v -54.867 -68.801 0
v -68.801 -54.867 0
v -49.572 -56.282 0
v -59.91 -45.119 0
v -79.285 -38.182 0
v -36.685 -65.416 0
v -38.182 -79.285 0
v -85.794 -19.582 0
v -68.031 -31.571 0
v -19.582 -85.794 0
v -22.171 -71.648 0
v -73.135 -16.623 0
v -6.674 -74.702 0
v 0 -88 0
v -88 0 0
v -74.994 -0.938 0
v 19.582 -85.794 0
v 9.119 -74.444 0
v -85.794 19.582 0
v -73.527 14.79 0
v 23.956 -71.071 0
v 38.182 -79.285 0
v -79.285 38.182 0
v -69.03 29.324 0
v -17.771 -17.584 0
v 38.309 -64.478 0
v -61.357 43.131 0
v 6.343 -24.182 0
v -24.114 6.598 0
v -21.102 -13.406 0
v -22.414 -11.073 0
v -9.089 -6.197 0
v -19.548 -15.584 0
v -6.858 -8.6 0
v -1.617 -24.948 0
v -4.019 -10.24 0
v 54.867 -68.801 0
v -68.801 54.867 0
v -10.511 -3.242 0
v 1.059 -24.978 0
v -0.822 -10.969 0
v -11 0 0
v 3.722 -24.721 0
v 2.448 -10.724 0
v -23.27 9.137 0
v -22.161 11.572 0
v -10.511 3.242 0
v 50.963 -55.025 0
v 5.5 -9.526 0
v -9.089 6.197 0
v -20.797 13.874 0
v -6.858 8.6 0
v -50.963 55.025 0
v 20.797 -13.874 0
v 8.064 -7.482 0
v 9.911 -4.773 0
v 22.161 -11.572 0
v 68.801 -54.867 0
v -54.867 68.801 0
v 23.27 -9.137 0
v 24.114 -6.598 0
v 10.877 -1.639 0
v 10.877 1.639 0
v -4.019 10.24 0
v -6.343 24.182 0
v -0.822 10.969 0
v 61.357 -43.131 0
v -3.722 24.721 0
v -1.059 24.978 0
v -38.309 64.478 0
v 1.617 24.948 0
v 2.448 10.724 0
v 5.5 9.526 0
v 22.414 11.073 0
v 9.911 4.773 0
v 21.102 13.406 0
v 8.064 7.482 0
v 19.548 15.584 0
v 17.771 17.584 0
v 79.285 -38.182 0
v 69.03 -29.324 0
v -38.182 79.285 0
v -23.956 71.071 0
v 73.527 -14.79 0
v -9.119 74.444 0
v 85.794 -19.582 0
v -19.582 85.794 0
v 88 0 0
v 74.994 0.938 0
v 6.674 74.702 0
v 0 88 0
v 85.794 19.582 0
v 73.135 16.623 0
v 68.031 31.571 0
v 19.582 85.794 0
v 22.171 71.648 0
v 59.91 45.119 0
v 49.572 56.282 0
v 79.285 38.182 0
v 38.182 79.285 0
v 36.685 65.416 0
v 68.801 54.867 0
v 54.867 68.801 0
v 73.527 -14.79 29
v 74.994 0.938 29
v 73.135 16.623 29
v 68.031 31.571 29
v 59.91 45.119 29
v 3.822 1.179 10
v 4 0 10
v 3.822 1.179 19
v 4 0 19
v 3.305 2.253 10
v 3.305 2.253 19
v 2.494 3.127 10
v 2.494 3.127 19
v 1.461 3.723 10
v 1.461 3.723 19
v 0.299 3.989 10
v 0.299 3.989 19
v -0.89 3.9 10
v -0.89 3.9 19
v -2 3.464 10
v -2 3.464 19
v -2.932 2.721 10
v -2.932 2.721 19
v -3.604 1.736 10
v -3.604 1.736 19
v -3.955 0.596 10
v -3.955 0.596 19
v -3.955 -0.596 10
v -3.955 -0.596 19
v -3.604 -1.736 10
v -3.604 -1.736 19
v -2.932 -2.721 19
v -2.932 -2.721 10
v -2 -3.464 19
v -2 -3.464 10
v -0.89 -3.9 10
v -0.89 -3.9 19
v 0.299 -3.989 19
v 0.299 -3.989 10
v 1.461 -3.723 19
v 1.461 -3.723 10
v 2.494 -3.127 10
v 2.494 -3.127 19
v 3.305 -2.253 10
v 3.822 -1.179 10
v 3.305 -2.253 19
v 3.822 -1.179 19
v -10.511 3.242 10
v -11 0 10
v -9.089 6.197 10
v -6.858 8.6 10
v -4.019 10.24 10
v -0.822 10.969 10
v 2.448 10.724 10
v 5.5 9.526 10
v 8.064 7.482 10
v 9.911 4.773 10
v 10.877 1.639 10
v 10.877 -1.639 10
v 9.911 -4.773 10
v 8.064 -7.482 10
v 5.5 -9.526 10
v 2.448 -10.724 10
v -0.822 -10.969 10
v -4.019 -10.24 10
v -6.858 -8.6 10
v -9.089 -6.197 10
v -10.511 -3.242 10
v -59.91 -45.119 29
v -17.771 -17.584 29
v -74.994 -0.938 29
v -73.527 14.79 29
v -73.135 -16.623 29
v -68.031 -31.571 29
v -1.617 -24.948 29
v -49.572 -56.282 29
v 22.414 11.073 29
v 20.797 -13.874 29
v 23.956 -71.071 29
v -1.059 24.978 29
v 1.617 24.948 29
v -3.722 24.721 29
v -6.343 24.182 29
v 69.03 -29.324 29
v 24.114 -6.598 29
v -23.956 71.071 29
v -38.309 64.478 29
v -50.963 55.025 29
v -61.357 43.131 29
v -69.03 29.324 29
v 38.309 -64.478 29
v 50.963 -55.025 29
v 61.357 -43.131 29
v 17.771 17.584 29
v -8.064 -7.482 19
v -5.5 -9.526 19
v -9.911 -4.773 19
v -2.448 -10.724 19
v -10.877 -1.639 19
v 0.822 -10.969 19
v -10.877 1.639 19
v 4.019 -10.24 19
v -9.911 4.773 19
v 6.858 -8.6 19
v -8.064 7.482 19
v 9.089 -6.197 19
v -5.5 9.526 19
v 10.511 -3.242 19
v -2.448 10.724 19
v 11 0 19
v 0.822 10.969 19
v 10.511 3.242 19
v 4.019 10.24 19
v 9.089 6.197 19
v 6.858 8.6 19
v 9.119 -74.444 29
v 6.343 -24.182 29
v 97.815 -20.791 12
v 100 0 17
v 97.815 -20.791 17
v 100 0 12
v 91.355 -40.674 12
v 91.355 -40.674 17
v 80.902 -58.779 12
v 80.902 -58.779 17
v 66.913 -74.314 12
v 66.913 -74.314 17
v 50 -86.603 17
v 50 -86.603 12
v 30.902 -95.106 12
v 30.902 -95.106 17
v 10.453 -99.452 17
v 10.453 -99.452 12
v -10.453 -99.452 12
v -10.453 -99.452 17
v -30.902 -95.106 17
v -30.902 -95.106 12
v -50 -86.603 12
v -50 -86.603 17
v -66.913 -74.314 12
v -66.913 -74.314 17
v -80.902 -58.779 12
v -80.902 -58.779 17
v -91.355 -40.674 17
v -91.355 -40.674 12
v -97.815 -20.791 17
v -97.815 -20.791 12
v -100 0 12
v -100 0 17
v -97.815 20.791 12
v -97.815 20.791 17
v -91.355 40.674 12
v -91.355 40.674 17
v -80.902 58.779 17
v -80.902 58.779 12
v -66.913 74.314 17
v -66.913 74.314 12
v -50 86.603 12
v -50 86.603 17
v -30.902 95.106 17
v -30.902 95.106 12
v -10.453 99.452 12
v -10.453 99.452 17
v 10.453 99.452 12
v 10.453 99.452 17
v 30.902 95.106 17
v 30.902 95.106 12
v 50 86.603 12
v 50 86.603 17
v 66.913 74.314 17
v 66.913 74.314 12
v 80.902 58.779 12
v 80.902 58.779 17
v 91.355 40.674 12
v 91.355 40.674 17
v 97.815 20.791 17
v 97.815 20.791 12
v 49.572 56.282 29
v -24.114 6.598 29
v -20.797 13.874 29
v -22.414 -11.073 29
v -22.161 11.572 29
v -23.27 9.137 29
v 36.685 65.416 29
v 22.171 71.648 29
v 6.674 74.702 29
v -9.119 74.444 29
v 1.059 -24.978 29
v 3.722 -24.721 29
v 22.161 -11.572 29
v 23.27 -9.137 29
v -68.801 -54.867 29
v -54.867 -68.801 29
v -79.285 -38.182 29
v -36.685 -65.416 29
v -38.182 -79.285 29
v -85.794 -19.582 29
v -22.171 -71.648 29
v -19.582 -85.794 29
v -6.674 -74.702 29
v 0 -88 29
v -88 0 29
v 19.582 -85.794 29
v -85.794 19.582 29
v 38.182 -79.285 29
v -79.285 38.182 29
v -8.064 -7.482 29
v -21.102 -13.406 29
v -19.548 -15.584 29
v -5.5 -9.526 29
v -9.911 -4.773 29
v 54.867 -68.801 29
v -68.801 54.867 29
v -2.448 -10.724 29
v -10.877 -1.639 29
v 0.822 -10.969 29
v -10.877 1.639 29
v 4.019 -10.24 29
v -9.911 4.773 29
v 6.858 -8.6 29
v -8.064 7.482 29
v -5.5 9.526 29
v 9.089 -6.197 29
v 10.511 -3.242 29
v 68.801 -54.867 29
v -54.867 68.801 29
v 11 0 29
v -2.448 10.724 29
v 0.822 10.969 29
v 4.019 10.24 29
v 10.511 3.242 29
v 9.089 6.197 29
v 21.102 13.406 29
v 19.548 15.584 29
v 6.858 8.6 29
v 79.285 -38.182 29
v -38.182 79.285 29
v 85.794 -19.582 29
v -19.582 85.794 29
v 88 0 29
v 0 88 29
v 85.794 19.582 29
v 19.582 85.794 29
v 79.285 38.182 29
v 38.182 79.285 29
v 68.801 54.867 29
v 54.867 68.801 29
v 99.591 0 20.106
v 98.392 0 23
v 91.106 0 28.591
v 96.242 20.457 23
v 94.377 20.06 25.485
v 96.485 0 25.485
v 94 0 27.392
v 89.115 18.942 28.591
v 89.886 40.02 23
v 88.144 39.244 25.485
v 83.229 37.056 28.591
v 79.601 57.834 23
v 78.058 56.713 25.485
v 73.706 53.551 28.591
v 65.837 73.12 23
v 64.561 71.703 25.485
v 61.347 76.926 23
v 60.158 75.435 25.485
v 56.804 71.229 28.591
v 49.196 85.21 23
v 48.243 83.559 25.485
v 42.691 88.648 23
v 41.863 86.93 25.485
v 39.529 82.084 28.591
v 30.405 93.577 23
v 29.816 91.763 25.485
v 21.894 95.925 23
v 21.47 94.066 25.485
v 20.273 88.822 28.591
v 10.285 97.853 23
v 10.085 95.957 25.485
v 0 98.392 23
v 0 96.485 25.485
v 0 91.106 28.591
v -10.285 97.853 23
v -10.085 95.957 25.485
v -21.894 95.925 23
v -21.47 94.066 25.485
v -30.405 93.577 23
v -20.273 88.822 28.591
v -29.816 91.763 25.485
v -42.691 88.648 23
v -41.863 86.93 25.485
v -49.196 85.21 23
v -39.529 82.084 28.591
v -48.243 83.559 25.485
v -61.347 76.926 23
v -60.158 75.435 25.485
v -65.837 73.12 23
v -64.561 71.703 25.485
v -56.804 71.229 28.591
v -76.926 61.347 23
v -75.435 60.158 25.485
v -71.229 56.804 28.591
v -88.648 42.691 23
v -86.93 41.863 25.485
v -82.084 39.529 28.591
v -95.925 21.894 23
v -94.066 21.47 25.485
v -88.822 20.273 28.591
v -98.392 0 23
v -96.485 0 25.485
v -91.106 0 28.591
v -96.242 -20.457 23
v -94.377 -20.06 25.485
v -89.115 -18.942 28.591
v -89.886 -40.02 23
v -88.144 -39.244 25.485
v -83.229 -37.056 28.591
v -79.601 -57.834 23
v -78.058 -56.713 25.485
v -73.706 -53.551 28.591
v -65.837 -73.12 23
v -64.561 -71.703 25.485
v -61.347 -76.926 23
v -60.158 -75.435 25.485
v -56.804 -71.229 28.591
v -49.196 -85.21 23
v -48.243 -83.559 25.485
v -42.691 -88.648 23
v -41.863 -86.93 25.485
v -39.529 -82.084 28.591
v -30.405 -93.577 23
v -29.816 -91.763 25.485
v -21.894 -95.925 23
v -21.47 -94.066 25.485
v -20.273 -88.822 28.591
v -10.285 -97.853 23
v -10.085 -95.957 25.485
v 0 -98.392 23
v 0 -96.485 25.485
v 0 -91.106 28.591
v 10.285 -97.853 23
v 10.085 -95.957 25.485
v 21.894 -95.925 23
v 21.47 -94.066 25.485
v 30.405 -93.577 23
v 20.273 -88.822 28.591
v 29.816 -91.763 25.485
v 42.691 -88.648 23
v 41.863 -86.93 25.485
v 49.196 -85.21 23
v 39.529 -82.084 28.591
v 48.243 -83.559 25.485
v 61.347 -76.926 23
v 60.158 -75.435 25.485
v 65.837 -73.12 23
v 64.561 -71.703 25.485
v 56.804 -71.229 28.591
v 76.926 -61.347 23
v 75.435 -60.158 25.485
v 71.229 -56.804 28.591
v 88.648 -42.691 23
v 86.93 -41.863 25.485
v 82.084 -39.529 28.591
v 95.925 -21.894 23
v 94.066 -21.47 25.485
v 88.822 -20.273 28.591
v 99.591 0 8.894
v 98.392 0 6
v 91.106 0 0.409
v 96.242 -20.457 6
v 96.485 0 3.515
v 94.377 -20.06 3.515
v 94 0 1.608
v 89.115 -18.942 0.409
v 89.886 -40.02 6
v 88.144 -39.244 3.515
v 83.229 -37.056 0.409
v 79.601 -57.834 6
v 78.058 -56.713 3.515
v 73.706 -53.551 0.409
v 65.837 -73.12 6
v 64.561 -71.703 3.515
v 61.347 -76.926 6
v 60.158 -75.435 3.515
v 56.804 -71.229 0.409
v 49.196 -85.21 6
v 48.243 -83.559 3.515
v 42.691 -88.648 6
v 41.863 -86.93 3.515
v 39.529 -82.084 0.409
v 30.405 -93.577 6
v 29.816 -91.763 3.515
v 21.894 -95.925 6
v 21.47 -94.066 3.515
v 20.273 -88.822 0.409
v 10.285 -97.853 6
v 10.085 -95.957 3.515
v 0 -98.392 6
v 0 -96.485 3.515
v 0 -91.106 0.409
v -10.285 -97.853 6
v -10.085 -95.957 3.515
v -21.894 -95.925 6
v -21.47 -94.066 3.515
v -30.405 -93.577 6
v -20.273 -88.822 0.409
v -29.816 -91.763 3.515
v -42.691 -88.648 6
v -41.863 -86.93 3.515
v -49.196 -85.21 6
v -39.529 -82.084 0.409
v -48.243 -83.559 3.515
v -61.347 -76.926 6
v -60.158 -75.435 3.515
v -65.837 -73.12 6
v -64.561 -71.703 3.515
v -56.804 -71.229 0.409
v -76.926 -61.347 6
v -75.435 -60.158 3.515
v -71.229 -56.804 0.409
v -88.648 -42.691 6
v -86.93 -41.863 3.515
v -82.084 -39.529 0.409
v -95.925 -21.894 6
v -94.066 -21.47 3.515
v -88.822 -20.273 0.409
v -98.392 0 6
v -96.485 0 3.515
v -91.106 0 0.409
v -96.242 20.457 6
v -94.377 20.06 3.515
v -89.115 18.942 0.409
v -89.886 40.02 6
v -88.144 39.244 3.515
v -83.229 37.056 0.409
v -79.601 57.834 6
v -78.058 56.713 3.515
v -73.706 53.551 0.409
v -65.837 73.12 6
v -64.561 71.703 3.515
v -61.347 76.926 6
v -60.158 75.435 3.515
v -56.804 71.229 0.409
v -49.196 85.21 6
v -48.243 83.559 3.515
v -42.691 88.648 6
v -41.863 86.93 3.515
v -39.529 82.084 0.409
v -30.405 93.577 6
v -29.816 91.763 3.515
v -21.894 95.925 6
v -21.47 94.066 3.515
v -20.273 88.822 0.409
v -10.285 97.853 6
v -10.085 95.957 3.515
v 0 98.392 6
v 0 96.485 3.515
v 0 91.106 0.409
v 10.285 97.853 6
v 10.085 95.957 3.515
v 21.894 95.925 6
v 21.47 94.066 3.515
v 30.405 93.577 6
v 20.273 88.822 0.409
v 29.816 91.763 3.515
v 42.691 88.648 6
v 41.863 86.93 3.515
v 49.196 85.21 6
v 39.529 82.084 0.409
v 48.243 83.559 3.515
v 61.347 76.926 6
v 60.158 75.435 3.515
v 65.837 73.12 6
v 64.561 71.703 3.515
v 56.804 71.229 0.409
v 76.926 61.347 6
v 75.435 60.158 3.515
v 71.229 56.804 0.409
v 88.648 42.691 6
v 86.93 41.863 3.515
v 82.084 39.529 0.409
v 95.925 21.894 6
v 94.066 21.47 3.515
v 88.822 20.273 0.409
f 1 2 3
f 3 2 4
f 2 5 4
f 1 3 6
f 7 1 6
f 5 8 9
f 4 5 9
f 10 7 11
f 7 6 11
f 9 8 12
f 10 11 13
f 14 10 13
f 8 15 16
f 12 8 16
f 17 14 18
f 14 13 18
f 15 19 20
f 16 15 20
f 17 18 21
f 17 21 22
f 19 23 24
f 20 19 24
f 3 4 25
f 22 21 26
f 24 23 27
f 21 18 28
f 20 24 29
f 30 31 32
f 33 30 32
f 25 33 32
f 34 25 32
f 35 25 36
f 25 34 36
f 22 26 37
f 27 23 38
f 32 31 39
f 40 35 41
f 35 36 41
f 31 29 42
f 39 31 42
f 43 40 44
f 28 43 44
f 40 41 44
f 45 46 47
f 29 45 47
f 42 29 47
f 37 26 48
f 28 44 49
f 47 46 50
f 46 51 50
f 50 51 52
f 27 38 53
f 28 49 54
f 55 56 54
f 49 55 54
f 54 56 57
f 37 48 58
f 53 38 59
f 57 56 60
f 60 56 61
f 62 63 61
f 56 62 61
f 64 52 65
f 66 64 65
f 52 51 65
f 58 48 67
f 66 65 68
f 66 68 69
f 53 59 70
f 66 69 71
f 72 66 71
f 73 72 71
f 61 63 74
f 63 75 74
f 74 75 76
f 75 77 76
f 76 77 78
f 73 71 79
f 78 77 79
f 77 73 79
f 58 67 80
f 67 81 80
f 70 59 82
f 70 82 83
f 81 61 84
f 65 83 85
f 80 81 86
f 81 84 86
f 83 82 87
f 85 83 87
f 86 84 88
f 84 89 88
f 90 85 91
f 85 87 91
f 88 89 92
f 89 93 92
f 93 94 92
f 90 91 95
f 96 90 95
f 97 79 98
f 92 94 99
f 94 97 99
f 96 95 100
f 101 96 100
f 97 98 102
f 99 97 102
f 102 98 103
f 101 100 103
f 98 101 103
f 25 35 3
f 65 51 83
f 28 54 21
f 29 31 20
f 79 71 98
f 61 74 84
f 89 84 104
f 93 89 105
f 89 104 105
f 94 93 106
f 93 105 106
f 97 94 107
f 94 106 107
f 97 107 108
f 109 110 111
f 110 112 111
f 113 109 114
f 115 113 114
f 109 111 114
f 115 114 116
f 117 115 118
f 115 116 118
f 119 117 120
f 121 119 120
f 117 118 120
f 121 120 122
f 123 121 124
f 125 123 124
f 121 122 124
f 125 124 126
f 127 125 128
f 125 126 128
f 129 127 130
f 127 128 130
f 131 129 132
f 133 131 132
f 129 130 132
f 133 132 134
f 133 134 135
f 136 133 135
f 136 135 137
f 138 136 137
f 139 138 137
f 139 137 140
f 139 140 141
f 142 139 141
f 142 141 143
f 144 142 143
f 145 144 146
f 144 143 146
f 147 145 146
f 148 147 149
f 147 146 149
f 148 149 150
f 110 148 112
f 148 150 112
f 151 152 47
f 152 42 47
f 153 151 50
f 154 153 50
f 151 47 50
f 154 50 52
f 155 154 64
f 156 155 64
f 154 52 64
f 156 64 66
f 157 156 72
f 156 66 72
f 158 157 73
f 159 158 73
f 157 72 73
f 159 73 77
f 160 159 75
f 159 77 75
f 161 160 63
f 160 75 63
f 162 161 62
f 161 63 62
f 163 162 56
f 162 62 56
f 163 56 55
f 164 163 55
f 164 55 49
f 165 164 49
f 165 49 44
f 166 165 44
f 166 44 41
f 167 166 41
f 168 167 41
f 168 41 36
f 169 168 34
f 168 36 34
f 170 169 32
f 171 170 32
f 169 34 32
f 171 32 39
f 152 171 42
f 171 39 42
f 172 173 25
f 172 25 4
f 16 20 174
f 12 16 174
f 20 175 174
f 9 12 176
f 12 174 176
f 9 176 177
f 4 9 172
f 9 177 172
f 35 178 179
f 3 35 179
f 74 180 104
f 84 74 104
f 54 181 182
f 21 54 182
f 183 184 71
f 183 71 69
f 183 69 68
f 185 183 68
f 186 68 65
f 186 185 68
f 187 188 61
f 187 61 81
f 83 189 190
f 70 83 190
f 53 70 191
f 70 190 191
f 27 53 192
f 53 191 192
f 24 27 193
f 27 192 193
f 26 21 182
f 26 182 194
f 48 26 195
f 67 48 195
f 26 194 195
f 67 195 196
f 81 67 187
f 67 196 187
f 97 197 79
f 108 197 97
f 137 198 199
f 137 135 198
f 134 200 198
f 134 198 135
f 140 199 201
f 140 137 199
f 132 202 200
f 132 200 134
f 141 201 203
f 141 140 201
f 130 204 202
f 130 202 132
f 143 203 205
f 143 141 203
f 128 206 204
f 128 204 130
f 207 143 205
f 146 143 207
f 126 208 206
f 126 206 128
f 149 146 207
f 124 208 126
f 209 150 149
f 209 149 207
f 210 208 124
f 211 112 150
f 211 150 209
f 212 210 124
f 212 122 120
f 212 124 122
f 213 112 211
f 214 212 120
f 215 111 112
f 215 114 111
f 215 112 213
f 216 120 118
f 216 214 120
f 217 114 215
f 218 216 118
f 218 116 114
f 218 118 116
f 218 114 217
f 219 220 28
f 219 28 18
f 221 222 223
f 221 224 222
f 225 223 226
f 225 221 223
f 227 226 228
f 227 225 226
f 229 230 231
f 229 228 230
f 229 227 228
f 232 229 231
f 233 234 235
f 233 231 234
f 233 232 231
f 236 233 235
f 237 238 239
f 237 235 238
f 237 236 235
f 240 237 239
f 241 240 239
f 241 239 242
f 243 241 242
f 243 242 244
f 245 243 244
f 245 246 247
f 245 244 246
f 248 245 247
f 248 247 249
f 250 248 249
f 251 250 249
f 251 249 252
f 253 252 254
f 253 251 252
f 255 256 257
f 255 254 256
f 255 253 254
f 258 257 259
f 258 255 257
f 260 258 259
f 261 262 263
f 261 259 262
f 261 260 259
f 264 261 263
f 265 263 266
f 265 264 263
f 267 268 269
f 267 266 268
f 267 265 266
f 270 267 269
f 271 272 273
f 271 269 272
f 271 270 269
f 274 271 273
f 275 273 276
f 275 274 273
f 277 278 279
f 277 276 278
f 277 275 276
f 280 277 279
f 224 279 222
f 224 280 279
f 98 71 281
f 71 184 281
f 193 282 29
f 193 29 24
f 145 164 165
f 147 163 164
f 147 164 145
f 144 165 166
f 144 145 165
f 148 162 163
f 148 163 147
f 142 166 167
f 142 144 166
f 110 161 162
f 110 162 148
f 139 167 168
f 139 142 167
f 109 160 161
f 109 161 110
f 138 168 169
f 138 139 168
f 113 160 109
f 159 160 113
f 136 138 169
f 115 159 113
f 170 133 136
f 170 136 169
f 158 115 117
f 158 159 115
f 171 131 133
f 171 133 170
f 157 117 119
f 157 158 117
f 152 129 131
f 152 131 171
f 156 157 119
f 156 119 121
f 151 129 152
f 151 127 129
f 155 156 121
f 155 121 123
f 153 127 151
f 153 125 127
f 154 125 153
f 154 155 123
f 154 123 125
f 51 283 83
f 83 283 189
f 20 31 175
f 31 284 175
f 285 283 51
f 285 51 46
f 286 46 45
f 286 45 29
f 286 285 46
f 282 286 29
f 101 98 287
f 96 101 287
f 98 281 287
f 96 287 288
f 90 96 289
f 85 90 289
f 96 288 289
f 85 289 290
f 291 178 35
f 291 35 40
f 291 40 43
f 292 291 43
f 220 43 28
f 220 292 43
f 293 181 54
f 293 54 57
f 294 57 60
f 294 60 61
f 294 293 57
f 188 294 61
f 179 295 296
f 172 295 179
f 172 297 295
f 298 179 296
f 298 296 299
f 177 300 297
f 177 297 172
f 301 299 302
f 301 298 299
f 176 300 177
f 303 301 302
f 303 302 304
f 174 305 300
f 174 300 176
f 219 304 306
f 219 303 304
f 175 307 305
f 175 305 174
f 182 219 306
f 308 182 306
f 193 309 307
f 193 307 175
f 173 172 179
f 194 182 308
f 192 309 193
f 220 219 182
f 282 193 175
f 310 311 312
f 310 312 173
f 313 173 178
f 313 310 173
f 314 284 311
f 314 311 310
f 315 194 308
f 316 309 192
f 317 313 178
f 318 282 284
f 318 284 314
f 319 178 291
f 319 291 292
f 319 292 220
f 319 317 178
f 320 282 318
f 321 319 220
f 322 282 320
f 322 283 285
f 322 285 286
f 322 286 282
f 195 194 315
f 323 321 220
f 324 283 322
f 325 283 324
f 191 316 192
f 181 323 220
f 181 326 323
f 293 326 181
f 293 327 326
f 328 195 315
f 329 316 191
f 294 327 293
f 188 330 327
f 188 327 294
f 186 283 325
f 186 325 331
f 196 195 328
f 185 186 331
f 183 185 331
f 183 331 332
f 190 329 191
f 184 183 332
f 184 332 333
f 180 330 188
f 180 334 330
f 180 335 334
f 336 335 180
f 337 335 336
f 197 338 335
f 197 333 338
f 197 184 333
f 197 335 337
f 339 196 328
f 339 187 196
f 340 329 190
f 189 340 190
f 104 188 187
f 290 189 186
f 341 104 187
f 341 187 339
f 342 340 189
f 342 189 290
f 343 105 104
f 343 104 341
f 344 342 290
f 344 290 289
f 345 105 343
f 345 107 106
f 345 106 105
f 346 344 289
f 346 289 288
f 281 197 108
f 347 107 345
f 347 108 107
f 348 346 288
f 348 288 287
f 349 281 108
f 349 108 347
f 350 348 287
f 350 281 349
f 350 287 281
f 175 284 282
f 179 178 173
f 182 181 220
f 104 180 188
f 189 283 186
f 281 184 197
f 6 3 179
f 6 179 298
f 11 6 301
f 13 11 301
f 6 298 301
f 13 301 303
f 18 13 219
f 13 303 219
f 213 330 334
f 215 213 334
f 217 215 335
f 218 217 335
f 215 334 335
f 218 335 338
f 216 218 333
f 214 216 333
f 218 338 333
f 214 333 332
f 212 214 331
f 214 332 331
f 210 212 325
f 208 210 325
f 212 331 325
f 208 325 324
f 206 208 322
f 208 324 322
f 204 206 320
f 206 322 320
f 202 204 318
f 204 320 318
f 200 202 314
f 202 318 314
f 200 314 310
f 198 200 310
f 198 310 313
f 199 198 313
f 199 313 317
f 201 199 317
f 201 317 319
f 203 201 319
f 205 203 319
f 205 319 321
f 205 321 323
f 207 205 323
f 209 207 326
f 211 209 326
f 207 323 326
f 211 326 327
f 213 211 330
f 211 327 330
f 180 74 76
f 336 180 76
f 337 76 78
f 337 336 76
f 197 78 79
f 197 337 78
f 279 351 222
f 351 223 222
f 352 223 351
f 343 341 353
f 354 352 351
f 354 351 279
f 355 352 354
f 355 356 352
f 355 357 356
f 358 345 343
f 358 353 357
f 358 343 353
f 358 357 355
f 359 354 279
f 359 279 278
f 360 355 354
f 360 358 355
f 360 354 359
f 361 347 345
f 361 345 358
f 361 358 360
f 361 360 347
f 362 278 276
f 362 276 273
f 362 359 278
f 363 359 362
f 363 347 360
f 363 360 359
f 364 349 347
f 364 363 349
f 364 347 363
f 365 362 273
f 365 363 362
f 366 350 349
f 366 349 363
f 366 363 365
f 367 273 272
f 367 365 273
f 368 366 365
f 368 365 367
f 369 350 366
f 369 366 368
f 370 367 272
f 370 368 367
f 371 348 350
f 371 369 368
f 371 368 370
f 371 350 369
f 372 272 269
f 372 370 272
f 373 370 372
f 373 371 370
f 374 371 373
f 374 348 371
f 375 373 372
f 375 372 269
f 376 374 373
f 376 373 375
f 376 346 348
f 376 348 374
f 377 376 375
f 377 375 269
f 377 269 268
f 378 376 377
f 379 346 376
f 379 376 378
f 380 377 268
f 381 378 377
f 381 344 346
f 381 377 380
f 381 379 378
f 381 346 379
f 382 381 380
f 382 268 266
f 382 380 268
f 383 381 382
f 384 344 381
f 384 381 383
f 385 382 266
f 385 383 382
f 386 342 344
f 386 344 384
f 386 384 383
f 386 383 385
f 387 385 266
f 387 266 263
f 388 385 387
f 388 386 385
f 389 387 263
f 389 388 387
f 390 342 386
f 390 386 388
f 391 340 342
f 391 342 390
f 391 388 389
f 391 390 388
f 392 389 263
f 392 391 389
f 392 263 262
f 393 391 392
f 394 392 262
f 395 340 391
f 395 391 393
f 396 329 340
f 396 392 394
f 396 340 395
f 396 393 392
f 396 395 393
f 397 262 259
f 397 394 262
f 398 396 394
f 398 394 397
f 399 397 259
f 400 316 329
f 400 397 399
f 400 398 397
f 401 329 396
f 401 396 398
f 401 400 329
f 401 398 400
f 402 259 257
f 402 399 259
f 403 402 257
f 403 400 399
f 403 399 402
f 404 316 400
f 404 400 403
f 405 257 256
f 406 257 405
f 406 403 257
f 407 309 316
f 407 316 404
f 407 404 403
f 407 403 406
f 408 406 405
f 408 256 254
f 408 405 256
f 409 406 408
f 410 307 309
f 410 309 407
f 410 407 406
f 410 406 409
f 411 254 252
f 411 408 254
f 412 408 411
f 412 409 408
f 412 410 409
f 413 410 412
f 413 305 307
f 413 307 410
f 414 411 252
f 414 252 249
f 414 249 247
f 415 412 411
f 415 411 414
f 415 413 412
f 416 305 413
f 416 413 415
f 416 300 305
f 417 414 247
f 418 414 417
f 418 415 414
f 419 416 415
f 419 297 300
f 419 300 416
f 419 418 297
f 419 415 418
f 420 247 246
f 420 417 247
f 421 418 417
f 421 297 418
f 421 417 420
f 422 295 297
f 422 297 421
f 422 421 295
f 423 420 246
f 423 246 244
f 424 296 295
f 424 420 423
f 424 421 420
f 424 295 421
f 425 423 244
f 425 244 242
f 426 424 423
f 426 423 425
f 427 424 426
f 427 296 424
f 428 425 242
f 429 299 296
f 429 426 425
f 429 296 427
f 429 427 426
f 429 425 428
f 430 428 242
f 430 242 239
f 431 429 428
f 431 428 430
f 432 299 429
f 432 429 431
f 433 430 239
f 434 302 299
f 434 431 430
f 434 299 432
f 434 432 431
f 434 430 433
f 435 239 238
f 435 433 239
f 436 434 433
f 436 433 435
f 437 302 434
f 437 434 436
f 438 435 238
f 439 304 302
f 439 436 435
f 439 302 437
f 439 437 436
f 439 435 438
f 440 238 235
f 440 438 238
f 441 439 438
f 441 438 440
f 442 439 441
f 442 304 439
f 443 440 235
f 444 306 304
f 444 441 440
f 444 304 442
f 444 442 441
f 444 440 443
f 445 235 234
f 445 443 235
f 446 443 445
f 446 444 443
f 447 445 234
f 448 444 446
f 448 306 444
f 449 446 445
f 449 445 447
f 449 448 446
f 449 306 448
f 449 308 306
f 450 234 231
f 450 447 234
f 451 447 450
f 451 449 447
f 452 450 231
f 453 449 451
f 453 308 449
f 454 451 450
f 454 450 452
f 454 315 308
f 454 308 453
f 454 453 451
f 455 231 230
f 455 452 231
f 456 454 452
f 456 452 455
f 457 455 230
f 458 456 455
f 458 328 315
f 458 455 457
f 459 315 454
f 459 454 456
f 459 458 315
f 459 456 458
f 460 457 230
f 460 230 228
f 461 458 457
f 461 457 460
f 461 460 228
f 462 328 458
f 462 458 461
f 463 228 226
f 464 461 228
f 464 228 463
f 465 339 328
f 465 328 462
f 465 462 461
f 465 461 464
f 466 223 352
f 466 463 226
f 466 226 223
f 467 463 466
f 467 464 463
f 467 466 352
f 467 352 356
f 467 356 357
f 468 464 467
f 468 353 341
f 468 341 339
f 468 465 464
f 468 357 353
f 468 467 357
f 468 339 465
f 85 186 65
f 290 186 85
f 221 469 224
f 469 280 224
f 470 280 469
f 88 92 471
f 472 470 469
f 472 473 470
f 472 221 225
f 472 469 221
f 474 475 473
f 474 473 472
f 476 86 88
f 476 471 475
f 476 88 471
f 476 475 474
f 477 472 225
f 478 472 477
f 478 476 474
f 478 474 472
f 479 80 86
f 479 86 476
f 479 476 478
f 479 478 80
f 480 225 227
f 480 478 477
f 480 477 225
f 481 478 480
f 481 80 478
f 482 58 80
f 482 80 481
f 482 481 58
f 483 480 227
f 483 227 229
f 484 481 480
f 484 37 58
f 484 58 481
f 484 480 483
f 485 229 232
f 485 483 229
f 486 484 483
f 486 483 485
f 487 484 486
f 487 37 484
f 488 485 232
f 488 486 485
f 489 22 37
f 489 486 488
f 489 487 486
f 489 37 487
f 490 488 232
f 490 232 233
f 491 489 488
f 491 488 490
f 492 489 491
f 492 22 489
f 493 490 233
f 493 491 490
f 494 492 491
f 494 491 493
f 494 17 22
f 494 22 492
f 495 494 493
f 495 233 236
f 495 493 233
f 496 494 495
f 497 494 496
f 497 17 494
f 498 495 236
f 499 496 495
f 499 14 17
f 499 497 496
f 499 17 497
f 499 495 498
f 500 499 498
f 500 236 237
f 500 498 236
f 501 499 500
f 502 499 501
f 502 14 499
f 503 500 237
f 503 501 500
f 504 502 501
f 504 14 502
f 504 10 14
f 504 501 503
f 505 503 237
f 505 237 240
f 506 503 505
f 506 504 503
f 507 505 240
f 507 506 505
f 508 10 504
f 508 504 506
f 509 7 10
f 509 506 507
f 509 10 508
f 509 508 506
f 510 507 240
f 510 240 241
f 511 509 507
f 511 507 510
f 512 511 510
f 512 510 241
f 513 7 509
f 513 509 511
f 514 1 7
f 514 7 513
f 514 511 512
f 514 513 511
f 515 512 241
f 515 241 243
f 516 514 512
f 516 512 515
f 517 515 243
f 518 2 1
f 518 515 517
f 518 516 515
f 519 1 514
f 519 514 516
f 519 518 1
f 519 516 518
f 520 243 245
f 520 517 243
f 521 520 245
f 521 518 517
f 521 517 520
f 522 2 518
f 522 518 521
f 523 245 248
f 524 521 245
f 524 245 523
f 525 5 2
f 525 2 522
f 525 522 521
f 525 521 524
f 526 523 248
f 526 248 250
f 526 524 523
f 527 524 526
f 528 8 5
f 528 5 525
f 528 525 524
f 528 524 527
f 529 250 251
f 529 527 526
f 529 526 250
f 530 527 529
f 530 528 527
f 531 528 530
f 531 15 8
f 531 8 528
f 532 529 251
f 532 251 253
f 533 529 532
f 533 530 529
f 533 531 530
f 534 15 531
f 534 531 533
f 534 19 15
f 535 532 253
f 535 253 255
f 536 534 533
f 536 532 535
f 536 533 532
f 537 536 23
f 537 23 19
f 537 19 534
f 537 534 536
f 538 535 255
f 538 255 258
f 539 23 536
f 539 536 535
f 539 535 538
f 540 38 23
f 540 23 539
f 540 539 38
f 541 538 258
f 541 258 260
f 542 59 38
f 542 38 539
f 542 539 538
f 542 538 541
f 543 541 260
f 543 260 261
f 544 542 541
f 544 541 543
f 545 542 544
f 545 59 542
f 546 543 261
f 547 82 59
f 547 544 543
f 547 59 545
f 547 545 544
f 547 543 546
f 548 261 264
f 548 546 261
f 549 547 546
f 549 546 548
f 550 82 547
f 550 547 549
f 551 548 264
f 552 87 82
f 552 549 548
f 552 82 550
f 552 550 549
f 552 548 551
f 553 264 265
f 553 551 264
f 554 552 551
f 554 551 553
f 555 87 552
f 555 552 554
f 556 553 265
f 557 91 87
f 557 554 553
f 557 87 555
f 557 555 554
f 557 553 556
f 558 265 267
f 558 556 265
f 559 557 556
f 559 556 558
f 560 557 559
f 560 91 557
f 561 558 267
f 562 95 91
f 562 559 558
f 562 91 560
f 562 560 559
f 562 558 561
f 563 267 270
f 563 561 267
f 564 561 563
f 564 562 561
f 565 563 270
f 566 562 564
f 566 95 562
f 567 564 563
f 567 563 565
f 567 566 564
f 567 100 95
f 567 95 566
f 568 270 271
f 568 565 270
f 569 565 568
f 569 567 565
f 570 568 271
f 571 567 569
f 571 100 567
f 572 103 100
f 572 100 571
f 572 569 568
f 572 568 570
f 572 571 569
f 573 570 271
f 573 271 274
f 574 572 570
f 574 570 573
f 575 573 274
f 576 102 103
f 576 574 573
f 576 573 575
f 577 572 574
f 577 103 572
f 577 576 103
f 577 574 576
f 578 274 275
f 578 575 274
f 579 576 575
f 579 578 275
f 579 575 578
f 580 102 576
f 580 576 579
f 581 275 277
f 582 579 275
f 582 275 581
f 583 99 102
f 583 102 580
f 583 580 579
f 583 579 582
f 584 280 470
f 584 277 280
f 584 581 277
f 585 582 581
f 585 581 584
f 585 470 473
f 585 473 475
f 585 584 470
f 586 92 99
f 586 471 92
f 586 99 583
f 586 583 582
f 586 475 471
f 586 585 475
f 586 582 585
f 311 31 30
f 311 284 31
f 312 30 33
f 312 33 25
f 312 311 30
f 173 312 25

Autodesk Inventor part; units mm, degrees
ref_plane "YZ Plane" through (0, 0, 0) normal (1, 0, 0) x (0, 1, 0)
ref_plane "XZ Plane" through (0, 0, 0) normal (0, 1, 0) x (-1, 0, 0)
ref_plane "XY Plane" through (0, 0, 0) normal (0, 0, 1) x (1, 0, 0)
sketch "Sketch1" plane through (0, 0, 0) normal (0, 0, 1) x (1, 0, 0)
  circle A0 centre (0, 0) radius 4
  circle A1 centre (0, 0) radius 100
  dimension "d0" = 8
  dimension "d1" = 200
extrude "Extrusion1" add sketch "Sketch1" along normal blind 29
fillet "Fillet1" radius 12 2 edges at (-100, 0, 29) (-100, 0, 0)
sketch "Sketch2" plane through (0, 0, 29) normal (0, 0, 1) x (1, 0, 0)
  circle A0 centre (0, 0) radius 88 projected
  line L0 (9.0297, 17.8456) -> (73.5273, -14.7895)
  line L1 (19.5363, -4.2815) -> (69.0295, -29.3245)
  arc A1 (19.5363, -4.2815) -> (9.0297, 17.8456) centre (0, 0) ccw
  arc A2 (69.0295, -29.3245) -> (73.5273, -14.7895) centre (0, 0) ccw
  line L2 (13.4761, 14.7782) -> (59.9105, 45.119)
  arc A3 (13.4761, 14.7782) -> (-10.9399, 16.7427) centre (0, 0) ccw
  arc A4 (59.9105, 45.119) -> (49.5718, 56.2818) centre (0, 0) ccw
  line L3 (-10.9399, 16.7427) -> (49.5718, 56.2818)
  line L4 (-6.0602, 19.0597) -> (-9.119, 74.4436)
  arc A5 (-6.0602, 19.0597) -> (-19.9696, -1.1029) centre (0, 0) ccw
  arc A6 (-9.119, 74.4436) -> (-23.9556, 71.0713) centre (0, 0) ccw
  line L5 (-19.9696, -1.1029) -> (-23.9556, 71.0713)
  line L6 (-19.5363, 4.2815) -> (-69.0295, 29.3245)
  arc A7 (-19.5363, 4.2815) -> (-9.0297, -17.8456) centre (0, 0) ccw
  arc A8 (-69.0295, 29.3245) -> (-73.5273, 14.7895) centre (0, 0) ccw
  line L7 (-9.0297, -17.8456) -> (-73.5273, 14.7895)
  line L8 (-13.4761, -14.7782) -> (-59.9105, -45.119)
  arc A9 (-13.4761, -14.7782) -> (10.9399, -16.7427) centre (0, 0) ccw
  arc A10 (-59.9105, -45.119) -> (-49.5718, -56.2818) centre (0, 0) ccw
  line L9 (10.9399, -16.7427) -> (-49.5718, -56.2818)
  line L10 (6.0602, -19.0597) -> (9.119, -74.4436)
  arc A11 (6.0602, -19.0597) -> (19.9696, 1.1029) centre (0, 0) ccw
  arc A12 (9.119, -74.4436) -> (23.9556, -71.0713) centre (0, 0) ccw
  line L11 (19.9696, 1.1029) -> (23.9556, -71.0713)
  circle A13 centre (0, 0) radius 4 projected
  circle A14 centre (0, 0) radius 75
  dimension "d7" = 15
  dimension "d8" = 75
  dimension "d9" = 20
  dimension "d12" = 360
extrude "Extrusion2" cut sketch "Sketch2" against normal through all contours A1 A11 A9 A7 A5 A3 | L2 A14 L0 | L4 A14 L3 | A14 L11 L1 | L6 A14 L5 | A14 L9 L10 | L8 A14 L7
sketch "Sketch3" plane through (0, 0, 29) normal (0, 0, 1) x (1, 0, 0)
  circle A0 centre (0, 0) radius 25
  circle A1 centre (0, 0) radius 20 projected
  dimension "d16" = 50
extrude "Extrusion3" add sketch "Sketch3" against normal blind 29
sketch "Sketch4" plane through (0, 0, 29) normal (0, 0, 1) x (1, 0, 0)
  circle A0 centre (0, 0) radius 20 projected
  circle A1 centre (0, 0) radius 4
  dimension "d19" = 8
extrude "Extrusion4" add sketch "Sketch4" against normal blind 29
sketch "Sketch5" plane through (0, 0, 29) normal (0, 0, 1) x (1, 0, 0)
  circle A0 centre (0, 0) radius 4 projected
  circle A1 centre (0, 0) radius 11
  dimension "d22" = 22
extrude "Extrusion5" cut sketch "Sketch5" against normal blind 10
sketch "Sketch7" plane through (0, 0, 0) normal (0, 0, -1) x (-1, 0, 0)
  circle A0 centre (0, 0) radius 4 projected
  circle A1 centre (0, 0) radius 11
  dimension "d25" = 22
extrude "Extrusion6" cut sketch "Sketch7" against normal blind 10
properties part number "Scooter Wheel" material "Rubber"
